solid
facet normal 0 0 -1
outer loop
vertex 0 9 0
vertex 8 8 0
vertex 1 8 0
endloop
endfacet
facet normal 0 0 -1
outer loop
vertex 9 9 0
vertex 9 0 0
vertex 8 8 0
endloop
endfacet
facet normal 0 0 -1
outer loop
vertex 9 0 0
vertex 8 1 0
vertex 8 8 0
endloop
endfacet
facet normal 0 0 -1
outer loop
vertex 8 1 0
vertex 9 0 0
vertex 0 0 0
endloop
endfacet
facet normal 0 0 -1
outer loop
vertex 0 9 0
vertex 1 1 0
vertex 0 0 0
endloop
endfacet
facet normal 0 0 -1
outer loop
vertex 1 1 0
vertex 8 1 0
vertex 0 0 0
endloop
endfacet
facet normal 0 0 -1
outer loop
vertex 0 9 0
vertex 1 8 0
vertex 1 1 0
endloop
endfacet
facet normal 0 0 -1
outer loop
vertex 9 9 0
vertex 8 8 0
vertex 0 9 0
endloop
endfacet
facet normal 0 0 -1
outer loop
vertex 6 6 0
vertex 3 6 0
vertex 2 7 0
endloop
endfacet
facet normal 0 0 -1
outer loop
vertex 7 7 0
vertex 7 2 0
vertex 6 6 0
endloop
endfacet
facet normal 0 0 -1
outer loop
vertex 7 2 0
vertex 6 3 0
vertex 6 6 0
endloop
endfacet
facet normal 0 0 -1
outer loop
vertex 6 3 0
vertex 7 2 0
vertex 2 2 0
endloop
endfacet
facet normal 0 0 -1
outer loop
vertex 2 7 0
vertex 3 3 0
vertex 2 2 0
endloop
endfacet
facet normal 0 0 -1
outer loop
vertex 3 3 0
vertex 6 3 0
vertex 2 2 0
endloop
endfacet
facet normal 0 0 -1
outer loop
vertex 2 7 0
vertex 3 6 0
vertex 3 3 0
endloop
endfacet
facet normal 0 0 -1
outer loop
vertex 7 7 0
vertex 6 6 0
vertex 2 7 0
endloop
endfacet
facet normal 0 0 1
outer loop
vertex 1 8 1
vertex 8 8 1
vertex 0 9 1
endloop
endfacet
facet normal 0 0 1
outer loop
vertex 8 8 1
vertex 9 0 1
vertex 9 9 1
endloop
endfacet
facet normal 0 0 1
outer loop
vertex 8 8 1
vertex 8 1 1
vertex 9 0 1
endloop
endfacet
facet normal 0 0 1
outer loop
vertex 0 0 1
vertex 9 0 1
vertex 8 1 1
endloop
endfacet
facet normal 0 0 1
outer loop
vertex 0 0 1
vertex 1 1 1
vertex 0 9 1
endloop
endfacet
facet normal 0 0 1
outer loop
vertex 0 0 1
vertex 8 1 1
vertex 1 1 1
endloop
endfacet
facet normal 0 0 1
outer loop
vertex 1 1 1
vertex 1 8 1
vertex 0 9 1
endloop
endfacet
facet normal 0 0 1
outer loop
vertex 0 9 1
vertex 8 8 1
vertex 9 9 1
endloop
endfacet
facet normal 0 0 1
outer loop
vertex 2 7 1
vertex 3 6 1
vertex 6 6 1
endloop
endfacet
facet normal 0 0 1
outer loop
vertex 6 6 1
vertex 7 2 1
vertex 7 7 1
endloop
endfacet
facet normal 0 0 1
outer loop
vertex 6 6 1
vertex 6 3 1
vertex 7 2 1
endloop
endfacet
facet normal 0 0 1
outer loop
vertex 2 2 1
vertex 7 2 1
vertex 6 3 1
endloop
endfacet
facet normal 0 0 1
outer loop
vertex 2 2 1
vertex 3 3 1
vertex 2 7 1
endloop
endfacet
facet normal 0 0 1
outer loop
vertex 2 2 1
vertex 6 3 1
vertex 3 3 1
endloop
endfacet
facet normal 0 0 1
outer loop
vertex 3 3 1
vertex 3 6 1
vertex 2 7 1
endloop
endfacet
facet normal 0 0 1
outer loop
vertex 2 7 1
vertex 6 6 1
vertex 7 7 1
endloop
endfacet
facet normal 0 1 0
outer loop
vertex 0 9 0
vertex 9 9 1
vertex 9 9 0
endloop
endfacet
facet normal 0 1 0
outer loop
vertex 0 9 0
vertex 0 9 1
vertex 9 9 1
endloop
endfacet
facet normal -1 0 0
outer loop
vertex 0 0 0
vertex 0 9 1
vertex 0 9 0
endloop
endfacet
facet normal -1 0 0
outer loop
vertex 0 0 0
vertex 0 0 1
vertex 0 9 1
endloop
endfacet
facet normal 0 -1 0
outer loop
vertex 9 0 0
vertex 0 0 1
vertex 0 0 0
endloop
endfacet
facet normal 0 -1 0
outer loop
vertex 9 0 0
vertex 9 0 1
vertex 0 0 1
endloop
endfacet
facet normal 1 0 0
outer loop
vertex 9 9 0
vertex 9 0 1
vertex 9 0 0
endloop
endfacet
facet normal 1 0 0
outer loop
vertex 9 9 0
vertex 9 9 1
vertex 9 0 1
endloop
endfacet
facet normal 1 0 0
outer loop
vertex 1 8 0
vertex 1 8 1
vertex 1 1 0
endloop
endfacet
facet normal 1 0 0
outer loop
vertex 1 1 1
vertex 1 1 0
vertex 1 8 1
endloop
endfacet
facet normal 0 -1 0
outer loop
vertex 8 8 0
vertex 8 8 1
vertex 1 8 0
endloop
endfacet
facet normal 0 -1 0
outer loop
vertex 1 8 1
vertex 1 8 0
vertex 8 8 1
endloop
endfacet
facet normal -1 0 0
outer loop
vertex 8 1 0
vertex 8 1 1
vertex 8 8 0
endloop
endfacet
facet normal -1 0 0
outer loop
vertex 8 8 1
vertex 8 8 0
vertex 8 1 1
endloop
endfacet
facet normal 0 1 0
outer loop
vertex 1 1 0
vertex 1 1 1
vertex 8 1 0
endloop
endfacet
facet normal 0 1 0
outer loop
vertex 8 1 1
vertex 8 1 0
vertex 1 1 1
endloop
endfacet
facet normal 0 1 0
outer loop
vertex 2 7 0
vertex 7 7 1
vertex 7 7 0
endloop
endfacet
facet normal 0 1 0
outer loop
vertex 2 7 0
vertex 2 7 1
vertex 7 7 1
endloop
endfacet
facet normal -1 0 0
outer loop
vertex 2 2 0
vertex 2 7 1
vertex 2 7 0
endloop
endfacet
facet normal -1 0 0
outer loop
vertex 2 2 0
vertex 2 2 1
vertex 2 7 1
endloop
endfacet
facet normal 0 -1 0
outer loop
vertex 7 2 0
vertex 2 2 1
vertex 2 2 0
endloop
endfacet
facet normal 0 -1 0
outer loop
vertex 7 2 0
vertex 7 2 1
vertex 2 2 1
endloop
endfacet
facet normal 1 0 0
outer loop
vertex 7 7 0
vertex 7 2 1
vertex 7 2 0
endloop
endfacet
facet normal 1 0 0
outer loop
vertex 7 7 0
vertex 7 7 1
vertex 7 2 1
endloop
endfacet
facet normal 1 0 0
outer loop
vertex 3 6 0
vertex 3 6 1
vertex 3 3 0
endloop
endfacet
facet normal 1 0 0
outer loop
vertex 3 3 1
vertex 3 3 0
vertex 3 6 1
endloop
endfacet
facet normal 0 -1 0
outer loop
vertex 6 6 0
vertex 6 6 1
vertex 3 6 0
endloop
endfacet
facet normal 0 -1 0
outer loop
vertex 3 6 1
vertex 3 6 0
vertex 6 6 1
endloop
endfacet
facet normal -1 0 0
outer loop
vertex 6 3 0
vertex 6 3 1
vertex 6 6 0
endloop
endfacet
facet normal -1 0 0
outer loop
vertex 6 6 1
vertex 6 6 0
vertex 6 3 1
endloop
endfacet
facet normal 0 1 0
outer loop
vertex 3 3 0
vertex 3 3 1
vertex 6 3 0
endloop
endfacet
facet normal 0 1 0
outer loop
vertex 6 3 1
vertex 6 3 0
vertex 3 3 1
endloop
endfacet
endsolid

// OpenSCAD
linear_extrude(1) {
    difference() {
        square([9,9]);
        translate([1,1]) {
            square([7,7]);
        }
    }

    translate([2,2]) {
        difference() {
            square([5,5]);
            translate([1,1]) {
                square([3,3]);
            }
        }
    }
}
